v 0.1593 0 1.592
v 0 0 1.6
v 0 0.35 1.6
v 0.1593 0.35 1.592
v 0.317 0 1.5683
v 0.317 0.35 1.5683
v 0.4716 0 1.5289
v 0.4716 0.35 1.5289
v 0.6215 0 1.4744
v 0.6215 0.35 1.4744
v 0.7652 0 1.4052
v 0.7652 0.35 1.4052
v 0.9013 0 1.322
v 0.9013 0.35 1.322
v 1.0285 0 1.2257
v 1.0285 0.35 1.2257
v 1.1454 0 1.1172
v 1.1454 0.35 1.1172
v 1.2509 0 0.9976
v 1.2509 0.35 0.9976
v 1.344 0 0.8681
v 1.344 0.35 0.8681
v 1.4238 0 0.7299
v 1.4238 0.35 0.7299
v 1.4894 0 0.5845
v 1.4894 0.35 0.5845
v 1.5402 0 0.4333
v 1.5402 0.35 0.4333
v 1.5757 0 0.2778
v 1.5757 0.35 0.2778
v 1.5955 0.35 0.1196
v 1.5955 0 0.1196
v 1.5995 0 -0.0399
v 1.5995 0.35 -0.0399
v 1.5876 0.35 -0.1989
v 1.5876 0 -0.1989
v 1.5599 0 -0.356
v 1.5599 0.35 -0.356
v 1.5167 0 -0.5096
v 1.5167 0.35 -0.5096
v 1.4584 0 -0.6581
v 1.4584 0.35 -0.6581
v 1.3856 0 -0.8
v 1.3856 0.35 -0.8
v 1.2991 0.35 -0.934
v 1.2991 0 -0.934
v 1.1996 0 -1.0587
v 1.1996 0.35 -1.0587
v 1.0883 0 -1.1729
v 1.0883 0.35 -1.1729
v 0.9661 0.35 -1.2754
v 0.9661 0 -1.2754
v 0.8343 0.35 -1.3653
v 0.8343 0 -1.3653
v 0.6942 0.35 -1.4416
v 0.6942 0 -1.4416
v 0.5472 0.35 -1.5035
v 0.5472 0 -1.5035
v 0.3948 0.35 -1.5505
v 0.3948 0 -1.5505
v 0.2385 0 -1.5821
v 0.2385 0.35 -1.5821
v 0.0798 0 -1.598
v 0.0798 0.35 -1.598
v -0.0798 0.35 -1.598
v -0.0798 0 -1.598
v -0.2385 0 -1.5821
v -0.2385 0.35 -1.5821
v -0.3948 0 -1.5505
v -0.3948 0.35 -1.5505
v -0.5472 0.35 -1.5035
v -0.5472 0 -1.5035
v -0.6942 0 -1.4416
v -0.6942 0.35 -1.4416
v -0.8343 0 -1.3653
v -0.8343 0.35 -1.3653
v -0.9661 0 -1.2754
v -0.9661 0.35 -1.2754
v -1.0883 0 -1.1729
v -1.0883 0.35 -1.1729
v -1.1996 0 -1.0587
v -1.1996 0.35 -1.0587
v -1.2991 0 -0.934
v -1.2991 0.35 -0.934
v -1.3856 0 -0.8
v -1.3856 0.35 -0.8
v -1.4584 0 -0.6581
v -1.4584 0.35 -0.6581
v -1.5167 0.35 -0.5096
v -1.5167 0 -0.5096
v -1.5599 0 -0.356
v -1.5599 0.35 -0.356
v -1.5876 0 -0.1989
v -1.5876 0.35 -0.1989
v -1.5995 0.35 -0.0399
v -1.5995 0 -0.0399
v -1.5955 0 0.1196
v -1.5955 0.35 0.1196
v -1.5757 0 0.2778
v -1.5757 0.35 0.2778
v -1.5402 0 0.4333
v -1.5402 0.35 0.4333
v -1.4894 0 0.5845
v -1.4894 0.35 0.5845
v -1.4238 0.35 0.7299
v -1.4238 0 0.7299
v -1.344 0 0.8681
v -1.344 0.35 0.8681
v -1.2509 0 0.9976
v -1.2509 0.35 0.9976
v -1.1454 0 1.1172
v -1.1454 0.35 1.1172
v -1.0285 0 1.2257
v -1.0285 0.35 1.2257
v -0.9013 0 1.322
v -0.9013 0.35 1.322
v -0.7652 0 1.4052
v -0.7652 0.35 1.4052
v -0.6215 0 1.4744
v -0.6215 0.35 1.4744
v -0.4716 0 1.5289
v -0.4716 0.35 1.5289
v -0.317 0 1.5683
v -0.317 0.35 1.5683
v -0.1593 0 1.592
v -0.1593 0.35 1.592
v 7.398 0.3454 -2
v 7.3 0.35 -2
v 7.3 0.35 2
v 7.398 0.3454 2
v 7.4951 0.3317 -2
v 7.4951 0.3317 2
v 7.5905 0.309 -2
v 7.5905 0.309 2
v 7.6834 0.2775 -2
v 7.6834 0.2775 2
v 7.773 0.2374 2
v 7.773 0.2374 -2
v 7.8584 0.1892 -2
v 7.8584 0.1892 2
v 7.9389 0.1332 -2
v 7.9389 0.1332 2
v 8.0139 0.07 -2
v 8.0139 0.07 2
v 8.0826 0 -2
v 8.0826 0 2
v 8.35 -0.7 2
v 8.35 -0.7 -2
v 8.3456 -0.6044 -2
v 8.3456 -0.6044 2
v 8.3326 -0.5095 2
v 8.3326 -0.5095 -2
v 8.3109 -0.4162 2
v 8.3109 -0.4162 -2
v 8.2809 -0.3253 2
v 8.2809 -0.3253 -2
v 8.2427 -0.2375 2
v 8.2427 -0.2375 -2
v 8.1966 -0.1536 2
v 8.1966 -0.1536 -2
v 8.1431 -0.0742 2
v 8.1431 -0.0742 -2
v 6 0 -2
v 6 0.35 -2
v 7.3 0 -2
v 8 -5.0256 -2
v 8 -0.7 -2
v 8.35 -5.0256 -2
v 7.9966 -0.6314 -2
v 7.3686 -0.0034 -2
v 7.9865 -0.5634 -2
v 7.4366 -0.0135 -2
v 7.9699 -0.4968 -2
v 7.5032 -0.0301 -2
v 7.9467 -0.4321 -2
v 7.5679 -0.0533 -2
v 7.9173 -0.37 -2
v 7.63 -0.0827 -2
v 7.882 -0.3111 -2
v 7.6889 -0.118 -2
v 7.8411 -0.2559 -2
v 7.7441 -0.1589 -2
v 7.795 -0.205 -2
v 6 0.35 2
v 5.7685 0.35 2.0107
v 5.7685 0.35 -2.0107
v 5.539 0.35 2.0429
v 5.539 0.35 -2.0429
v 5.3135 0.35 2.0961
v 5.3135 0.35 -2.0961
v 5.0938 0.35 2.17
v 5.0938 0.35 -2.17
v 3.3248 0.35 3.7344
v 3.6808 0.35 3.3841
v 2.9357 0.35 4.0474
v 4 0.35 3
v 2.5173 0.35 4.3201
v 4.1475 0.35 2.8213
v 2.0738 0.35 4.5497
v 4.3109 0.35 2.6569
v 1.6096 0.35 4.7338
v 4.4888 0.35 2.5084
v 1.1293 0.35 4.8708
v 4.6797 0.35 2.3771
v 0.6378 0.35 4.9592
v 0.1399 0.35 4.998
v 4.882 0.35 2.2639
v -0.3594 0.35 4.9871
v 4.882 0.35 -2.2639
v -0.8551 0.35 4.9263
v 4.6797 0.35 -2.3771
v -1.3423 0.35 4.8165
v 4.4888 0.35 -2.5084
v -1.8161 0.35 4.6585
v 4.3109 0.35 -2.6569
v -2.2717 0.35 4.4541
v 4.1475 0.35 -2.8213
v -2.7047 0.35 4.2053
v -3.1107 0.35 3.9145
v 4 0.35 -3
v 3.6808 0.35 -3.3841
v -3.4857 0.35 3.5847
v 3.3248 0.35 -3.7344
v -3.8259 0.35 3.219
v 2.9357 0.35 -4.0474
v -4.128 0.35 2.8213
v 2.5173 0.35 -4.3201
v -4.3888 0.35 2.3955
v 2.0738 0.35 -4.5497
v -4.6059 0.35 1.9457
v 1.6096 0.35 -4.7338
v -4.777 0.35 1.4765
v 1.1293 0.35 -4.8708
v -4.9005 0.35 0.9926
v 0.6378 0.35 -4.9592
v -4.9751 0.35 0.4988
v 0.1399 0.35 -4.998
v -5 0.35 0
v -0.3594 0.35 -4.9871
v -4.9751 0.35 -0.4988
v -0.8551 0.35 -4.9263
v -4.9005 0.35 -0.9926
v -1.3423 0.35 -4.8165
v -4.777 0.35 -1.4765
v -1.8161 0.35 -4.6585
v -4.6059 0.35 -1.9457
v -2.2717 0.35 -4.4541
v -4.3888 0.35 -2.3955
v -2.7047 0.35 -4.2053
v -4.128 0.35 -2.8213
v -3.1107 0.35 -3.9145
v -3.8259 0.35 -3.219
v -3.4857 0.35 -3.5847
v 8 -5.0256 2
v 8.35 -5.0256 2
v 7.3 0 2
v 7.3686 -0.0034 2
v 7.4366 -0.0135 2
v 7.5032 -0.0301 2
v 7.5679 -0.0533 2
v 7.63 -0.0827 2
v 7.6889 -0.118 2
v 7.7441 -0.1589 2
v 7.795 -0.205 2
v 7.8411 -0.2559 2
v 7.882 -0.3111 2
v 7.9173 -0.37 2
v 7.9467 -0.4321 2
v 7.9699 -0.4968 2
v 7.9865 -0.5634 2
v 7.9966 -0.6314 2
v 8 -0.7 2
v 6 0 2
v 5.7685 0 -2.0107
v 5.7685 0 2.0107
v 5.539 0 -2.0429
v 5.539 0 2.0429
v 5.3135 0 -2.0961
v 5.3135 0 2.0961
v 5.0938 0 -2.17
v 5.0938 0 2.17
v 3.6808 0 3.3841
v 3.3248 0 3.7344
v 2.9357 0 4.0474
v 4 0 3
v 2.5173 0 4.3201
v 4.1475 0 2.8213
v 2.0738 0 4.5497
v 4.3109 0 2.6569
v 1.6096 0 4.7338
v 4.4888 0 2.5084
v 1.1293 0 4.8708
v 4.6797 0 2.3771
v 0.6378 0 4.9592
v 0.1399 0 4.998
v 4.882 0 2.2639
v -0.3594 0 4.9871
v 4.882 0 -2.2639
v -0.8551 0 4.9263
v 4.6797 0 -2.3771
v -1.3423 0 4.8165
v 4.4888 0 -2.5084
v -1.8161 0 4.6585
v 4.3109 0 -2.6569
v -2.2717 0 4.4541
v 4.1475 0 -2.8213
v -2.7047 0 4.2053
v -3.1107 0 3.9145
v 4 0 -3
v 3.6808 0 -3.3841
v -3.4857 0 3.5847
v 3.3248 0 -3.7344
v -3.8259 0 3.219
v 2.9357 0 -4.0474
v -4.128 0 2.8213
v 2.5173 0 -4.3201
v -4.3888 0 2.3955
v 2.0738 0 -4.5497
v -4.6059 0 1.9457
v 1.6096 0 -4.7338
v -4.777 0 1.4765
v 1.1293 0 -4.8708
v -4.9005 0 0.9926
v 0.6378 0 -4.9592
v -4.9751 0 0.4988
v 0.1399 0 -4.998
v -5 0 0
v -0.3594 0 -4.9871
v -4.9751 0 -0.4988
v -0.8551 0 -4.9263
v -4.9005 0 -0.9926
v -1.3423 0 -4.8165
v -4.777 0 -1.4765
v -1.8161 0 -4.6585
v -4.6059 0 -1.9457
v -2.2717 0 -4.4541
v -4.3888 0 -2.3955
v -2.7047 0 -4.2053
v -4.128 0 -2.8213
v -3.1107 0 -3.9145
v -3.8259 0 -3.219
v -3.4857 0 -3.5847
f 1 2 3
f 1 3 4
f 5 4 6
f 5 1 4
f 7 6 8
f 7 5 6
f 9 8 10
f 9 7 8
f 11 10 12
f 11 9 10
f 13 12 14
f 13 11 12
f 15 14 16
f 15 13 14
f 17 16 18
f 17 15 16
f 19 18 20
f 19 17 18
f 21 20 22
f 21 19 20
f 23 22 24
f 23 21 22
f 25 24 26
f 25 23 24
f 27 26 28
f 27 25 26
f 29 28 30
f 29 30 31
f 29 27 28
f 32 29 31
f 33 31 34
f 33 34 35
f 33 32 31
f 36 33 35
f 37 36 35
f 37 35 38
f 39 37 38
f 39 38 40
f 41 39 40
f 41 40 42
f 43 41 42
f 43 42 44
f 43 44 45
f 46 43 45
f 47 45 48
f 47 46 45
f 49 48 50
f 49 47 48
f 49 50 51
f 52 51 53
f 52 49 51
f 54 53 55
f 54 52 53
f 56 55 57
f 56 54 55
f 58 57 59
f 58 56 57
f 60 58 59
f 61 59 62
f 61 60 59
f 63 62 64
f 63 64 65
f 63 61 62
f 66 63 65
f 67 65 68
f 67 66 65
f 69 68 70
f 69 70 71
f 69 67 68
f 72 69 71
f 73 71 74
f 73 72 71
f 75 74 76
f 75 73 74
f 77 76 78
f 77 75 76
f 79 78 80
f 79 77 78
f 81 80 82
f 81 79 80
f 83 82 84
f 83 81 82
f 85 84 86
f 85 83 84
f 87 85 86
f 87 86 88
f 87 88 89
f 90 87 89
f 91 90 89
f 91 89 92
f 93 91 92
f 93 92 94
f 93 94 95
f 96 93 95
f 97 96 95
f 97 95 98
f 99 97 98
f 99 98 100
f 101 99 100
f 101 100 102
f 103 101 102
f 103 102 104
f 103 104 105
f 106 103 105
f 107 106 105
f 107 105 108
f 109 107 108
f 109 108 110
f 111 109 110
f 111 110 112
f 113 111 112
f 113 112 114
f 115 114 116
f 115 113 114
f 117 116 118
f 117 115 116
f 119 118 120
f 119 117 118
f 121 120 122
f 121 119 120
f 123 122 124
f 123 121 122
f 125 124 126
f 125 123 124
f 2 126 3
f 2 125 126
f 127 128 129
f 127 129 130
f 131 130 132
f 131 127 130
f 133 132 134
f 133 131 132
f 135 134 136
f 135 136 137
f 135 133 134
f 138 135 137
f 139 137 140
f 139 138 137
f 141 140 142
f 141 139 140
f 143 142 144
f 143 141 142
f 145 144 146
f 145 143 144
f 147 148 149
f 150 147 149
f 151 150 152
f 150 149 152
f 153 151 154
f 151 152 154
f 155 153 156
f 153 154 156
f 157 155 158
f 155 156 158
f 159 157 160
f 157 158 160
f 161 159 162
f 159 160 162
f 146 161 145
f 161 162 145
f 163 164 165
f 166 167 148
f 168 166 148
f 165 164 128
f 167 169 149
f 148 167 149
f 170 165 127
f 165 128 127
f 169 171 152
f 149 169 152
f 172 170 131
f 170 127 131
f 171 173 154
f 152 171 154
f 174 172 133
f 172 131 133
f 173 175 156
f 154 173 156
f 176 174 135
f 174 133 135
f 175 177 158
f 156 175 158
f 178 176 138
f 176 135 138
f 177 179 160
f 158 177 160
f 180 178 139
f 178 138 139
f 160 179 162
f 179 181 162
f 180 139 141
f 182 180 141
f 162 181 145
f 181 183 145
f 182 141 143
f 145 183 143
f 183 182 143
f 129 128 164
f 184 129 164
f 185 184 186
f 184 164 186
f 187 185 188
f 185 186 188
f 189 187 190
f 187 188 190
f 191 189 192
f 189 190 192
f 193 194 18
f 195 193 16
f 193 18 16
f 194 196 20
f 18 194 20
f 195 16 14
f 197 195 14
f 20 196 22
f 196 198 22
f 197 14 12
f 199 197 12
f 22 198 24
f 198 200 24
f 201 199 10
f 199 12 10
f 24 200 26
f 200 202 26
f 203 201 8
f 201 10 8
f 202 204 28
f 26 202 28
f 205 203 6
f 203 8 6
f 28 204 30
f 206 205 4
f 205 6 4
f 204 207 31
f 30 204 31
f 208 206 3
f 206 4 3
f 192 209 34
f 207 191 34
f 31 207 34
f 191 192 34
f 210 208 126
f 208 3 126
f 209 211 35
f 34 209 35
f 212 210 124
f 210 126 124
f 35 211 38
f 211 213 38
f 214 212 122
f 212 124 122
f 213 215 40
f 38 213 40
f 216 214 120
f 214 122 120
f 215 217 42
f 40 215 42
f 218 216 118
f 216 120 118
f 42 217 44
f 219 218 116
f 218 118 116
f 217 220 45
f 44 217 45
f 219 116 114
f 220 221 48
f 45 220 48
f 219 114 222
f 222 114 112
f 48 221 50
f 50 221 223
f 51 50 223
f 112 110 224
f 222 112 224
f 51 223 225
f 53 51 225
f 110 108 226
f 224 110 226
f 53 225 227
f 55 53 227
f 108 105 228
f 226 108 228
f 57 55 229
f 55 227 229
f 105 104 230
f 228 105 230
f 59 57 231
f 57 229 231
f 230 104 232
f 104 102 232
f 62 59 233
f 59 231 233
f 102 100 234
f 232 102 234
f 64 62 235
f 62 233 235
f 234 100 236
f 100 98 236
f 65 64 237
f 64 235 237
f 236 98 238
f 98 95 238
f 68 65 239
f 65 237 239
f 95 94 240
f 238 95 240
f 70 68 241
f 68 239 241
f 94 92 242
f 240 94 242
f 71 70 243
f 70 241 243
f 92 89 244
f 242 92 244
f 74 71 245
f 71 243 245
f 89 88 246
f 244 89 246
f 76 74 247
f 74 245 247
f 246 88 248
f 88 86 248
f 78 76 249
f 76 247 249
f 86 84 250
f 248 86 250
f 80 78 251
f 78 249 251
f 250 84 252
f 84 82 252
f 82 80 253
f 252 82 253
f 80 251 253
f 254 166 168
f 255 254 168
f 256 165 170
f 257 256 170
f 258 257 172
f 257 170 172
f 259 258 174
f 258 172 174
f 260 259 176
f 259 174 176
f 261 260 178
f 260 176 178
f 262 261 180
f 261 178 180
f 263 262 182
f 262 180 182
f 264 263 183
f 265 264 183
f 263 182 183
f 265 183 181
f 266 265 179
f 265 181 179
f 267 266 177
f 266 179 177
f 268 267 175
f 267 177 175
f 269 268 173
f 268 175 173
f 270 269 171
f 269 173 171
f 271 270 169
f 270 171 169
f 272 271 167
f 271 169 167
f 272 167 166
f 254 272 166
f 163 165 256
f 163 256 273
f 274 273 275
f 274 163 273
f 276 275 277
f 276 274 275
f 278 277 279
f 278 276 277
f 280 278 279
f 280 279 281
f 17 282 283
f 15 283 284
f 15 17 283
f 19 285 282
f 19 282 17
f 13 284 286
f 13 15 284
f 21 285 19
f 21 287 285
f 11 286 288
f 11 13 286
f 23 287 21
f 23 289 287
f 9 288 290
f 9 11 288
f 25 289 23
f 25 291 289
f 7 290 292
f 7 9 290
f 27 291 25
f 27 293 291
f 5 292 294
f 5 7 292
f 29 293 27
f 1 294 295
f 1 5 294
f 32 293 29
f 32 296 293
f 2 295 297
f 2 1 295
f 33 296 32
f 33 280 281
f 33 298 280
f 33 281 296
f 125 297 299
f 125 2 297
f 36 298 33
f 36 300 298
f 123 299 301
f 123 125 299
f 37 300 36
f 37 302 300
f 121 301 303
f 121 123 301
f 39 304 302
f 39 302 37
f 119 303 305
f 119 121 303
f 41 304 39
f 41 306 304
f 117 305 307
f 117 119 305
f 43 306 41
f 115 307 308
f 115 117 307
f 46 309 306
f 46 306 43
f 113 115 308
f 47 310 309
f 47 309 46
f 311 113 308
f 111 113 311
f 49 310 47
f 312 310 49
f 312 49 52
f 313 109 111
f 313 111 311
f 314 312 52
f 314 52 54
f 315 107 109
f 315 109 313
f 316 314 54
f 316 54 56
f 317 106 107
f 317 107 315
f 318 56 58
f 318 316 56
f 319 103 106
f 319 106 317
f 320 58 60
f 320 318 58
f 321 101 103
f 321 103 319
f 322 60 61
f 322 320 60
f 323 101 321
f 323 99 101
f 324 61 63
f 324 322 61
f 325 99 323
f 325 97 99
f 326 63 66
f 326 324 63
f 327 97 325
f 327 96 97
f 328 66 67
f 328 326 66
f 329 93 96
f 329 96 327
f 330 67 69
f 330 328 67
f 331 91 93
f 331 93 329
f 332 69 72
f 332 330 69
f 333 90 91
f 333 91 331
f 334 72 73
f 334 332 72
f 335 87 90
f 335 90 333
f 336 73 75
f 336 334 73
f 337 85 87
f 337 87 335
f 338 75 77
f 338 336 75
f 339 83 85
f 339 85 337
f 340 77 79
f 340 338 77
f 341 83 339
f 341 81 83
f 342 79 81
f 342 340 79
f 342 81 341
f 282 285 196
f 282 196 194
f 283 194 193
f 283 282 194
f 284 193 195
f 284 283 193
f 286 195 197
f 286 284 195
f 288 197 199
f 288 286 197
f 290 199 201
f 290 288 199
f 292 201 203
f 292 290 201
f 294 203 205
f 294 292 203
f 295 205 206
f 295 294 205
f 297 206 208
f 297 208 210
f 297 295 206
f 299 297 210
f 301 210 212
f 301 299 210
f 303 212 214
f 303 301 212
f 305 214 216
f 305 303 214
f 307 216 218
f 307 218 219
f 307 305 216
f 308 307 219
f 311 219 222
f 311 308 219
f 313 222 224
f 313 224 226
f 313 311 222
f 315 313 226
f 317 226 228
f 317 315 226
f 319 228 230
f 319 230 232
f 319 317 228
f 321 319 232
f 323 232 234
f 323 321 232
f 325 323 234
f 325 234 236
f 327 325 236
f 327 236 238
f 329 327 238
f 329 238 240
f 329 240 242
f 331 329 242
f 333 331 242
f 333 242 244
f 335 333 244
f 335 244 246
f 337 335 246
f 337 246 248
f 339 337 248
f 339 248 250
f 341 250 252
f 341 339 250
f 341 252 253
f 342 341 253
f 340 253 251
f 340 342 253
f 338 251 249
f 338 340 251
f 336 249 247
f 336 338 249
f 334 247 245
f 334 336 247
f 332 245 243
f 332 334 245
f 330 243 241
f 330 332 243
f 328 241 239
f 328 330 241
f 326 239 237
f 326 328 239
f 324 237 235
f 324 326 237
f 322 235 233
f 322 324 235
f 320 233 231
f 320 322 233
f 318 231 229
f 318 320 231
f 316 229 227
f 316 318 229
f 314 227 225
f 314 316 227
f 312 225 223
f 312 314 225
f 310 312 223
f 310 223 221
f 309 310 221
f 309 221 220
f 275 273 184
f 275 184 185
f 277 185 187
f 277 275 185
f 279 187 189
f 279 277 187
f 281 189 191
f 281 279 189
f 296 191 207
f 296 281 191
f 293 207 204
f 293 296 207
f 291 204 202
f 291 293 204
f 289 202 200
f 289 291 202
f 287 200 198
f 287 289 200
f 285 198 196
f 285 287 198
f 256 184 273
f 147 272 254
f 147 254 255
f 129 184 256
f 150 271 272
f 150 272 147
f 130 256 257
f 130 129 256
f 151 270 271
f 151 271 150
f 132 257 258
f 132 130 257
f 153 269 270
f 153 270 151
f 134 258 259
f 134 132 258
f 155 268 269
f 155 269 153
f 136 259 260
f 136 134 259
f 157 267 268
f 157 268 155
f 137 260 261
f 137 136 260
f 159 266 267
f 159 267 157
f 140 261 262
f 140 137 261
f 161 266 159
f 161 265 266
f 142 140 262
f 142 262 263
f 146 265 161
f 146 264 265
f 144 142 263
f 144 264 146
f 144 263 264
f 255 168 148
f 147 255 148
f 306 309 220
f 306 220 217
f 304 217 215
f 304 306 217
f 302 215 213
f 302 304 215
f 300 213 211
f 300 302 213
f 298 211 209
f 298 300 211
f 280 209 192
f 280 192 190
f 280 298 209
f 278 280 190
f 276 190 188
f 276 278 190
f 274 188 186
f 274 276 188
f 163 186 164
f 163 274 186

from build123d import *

# Parameters (mm, degrees)
SKICA1_R               = 1.6
Z_KLADN_PLECH1_DEPTH   = 0.35
OHYB_START             = -2
OHYB_ZE_SKICI1_DEPTH   = 4
OHYB_ZE_SKICI1_2_DEPTH = 4


# Read off the part's stored shape, not the designer's step: Ohyb ze skici1
# Sheet-metal steps are written as plain solids
with BuildPart() as part:
    # Skica1 → Základní plech1 (new body)
    with BuildSketch(Plane(origin=(0, 0, 0), x_dir=(1, 0, 0), z_dir=(0, 1, 0))):
        with BuildLine():
            Line((6, 2), (13, 2))
            Line((13, 2), (13, -2))
            Line((13, -2), (6, -2))
            ThreePointArc((6, -2), (4.881966011, -2.263932023), (4, -3))
            ThreePointArc((4, -3), (-5, 0), (4, 3))
            ThreePointArc((4, 3), (4.881966011, 2.263932023), (6, 2))
        make_face()
        with Locations(Location((0, 0, 0), (0, 0, 270))):
            Circle(SKICA1_R, mode=Mode.SUBTRACT)
    extrude(amount=Z_KLADN_PLECH1_DEPTH)

    # Ohyb ze skici1 outline → Ohyb ze skici1 (cut)
    with BuildSketch(Plane.XY.offset(OHYB_START)):
        with BuildLine():
            ThreePointArc((7.3, 0.350000005), (7.728660709, 0.258514479), (8.082623799, 0))
            Line((8.082623799, 0), (13, 0))
            Line((13, 0), (13, 0.35))
            Line((13, 0.35), (7.3, 0.350000005))
        make_face()
    extrude(amount=OHYB_ZE_SKICI1_DEPTH, mode=Mode.SUBTRACT)

    # Ohyb ze skici1 2 outline → Ohyb ze skici1 2 (add)
    with BuildSketch(Plane.XY.offset(OHYB_START)):
        with BuildLine():
            Line((8.35, -5.025553214), (8.350000005, -0.700000005))
            ThreePointArc((8.350000005, -0.700000005), (8.280880984, -0.325336808), (8.082623799, 0))
            Line((8.082623799, 0), (7.3, 5e-09))
            ThreePointArc((7.3, 5e-09), (7.79497475, -0.20502525), (8.000000005, -0.7))
            Line((8.000000005, -0.7), (8, -5.025553214))
            Line((8, -5.025553214), (8.35, -5.025553214))
        make_face()
    extrude(amount=OHYB_ZE_SKICI1_2_DEPTH)


solid = part.part
